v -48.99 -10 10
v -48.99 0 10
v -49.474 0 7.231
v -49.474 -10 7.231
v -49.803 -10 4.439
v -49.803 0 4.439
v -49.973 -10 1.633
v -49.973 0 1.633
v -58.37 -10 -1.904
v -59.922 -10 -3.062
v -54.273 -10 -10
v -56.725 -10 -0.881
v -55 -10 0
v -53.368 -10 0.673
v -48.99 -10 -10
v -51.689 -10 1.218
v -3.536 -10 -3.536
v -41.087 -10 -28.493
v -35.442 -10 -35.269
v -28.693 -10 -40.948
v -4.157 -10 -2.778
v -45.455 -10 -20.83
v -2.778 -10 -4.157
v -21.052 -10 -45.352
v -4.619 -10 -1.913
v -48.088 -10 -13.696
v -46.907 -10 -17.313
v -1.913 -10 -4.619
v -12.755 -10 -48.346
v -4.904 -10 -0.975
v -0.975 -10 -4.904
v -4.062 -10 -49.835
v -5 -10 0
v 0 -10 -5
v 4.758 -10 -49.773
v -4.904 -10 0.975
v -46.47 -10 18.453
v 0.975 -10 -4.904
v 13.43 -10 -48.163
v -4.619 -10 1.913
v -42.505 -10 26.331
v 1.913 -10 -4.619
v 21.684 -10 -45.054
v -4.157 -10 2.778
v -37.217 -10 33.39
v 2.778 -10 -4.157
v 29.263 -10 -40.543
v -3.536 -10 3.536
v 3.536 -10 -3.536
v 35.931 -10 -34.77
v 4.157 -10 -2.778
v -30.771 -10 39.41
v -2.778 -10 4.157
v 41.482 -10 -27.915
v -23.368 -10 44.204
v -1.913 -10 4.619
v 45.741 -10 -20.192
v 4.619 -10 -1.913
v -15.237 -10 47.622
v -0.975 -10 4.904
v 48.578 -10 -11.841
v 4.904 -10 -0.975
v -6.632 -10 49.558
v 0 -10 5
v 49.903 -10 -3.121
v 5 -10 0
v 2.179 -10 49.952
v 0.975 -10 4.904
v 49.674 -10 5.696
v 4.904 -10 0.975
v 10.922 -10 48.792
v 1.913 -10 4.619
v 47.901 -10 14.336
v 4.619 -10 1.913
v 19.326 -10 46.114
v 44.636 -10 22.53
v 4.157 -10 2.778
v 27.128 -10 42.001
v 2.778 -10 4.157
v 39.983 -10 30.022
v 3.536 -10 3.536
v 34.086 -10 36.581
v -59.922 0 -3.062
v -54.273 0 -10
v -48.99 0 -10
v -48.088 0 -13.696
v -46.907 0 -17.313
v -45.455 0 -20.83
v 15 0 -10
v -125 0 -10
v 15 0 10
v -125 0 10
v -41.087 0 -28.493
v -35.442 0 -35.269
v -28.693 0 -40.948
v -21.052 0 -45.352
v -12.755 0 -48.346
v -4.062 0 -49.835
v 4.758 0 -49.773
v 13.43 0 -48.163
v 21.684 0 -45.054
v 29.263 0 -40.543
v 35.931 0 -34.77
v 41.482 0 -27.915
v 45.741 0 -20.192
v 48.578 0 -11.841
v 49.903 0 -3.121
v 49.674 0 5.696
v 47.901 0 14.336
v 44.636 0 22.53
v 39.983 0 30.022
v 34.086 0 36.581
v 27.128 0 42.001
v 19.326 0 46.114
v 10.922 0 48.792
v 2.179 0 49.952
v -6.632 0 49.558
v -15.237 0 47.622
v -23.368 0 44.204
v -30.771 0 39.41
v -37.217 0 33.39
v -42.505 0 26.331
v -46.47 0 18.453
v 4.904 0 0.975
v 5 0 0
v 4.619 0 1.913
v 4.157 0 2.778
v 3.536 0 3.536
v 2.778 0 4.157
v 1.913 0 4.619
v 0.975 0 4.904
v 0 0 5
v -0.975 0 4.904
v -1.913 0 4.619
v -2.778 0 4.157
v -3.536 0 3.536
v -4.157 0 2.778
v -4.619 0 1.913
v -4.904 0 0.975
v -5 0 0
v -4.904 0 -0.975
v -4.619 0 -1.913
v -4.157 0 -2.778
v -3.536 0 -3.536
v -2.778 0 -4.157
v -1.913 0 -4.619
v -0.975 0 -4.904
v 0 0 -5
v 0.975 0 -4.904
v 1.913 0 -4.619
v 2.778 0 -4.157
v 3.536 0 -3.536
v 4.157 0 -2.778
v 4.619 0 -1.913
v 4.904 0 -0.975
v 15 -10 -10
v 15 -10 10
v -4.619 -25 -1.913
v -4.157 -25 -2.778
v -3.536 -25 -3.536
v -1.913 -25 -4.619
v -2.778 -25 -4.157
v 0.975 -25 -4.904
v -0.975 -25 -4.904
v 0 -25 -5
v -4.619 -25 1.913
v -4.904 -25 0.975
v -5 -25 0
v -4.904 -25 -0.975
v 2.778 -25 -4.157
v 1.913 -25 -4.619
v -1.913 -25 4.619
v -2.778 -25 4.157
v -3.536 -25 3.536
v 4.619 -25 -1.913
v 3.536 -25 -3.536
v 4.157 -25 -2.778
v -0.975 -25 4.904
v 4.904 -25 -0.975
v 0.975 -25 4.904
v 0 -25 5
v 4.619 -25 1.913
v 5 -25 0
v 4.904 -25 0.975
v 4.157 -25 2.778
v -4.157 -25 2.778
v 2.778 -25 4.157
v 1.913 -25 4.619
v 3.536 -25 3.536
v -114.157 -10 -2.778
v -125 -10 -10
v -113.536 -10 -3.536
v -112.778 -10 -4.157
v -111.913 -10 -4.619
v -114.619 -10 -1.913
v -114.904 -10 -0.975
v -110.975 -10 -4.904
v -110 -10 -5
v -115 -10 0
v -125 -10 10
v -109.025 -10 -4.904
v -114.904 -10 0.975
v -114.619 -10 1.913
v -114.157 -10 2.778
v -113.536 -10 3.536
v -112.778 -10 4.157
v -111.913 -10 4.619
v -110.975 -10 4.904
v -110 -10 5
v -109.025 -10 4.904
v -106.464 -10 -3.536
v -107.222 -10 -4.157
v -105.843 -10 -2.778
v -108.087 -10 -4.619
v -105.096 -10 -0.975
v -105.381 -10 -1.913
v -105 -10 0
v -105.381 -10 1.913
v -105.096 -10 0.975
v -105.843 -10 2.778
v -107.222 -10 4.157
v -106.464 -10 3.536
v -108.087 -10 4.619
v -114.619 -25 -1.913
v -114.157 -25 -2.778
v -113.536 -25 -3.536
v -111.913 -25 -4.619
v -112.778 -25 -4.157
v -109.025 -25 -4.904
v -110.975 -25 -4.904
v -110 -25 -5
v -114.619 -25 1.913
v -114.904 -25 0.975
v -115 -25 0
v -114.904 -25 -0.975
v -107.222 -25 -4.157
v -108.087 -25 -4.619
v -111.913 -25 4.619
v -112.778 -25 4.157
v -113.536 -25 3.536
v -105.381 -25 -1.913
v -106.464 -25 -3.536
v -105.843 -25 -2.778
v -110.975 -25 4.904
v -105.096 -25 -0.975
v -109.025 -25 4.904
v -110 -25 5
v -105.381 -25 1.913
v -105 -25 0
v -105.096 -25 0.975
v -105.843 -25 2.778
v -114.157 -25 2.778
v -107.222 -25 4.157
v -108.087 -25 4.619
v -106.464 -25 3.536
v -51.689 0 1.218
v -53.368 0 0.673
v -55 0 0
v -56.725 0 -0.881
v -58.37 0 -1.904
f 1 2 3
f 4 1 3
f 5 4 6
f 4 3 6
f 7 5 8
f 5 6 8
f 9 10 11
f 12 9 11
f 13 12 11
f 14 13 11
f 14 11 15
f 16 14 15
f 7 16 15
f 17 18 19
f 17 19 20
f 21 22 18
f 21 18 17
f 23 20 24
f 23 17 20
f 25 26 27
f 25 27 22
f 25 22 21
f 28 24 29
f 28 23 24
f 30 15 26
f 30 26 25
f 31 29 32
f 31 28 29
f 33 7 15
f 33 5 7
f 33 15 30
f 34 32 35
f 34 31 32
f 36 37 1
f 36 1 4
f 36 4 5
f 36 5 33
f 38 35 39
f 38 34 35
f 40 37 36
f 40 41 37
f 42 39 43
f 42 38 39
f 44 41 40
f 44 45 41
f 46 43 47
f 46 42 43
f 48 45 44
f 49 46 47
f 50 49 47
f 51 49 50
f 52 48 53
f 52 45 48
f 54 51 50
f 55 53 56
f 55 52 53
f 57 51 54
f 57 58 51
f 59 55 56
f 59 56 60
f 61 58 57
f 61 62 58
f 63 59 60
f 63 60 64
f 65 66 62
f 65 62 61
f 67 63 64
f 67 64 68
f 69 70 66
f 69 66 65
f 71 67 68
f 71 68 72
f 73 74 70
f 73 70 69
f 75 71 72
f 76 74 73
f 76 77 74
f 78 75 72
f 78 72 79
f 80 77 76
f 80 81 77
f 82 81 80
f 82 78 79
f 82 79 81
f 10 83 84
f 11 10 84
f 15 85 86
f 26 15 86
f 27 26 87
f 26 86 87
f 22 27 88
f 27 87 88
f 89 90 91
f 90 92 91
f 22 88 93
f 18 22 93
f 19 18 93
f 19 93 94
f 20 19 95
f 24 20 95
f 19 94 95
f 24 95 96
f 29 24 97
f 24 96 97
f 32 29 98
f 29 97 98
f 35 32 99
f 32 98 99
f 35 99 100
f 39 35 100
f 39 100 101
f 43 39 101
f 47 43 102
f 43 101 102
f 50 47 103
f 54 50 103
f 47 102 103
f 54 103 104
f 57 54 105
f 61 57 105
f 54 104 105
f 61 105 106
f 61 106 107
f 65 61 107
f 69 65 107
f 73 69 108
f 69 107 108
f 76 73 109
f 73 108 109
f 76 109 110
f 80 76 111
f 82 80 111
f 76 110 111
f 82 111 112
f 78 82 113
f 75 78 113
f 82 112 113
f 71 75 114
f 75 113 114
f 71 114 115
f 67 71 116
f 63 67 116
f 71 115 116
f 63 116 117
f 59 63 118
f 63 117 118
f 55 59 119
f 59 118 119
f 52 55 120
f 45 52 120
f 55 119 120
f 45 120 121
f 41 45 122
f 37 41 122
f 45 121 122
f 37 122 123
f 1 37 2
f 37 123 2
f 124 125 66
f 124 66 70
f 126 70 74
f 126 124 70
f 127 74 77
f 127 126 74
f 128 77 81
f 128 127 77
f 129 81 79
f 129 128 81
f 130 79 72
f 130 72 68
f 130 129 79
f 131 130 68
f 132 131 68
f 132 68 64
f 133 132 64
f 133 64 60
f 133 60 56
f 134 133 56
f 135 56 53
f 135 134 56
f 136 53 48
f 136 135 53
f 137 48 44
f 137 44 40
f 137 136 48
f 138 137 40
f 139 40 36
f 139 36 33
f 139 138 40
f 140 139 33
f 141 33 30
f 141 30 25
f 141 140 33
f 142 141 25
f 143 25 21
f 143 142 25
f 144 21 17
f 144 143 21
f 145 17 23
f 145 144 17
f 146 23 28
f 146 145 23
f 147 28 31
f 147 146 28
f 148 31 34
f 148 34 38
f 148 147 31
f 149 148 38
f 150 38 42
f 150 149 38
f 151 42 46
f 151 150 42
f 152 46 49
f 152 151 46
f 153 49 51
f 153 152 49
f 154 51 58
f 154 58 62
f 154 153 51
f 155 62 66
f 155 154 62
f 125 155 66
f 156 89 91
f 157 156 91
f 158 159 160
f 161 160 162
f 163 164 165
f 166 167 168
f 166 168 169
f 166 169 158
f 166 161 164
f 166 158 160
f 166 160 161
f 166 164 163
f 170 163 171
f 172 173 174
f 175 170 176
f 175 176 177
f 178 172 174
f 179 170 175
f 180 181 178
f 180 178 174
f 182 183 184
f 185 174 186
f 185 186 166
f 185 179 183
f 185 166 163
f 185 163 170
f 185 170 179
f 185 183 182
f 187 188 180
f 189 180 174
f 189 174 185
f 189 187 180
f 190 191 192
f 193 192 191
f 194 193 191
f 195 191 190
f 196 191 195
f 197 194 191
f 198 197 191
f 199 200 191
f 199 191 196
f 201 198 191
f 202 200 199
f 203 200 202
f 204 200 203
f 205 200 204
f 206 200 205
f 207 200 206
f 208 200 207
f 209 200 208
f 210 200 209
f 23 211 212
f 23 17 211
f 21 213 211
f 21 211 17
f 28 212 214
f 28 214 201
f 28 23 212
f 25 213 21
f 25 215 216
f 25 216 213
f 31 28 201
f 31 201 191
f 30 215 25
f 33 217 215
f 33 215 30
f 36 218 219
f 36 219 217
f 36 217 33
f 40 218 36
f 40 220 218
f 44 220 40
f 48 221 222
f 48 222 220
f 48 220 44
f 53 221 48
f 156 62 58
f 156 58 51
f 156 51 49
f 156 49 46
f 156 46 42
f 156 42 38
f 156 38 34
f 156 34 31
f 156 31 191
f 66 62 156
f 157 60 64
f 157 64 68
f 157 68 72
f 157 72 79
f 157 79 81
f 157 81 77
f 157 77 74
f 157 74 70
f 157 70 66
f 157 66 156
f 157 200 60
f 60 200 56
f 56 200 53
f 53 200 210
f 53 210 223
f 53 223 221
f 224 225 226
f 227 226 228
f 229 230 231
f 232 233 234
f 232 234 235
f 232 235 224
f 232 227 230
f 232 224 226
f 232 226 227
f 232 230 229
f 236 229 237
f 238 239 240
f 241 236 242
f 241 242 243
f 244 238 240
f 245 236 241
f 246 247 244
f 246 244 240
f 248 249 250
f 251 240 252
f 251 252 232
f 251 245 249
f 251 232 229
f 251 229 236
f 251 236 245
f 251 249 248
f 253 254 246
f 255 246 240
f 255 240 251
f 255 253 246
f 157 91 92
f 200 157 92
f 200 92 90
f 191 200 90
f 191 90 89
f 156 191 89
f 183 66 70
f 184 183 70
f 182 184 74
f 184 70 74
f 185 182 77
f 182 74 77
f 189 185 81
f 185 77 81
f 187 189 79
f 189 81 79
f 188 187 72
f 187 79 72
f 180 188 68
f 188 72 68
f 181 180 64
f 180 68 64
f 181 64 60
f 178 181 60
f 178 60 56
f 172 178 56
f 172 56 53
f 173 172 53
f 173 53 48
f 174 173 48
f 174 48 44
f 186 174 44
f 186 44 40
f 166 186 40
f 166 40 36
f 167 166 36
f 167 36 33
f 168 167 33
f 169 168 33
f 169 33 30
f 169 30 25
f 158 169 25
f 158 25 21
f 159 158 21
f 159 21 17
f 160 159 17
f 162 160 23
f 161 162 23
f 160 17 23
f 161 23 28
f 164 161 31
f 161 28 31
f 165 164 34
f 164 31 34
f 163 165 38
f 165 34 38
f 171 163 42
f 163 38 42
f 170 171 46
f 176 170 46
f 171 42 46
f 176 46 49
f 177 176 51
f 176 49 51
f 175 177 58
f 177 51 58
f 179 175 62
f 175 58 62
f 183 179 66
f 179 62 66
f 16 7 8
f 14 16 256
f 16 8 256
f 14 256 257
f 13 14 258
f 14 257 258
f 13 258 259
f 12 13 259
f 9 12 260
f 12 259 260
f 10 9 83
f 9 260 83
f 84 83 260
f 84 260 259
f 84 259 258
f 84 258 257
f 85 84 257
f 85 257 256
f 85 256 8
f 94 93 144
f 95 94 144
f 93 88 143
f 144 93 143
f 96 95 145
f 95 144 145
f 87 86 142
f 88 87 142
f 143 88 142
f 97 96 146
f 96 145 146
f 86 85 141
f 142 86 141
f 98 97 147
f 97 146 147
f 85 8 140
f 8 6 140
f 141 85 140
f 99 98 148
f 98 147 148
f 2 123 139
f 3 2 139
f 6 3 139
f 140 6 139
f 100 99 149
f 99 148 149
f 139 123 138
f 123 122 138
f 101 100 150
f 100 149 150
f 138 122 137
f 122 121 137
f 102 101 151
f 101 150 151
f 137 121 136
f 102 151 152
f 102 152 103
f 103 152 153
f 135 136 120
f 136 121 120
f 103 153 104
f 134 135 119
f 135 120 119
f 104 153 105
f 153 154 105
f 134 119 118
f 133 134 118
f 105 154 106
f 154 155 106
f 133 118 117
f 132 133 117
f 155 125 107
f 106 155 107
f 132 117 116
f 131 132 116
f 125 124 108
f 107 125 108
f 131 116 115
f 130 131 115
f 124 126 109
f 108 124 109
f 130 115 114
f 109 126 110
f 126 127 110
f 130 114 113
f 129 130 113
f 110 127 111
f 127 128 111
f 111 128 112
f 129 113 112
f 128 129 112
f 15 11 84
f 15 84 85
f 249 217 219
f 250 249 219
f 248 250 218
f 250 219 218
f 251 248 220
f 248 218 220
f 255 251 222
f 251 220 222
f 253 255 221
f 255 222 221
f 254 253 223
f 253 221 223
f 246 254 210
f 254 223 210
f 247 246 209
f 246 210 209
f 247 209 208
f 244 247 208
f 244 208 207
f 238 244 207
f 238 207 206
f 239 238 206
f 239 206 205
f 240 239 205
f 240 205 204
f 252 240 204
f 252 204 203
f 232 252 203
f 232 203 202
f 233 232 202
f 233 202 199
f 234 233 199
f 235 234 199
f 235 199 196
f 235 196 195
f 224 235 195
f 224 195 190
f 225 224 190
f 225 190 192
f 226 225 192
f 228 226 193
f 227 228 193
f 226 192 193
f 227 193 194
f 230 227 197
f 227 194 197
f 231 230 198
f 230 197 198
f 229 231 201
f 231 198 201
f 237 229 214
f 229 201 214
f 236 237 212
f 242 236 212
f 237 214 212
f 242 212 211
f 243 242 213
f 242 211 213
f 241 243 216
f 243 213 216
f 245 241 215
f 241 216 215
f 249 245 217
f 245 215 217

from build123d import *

# Parameters (mm, degrees)
F0_R     = 5
F1_DEPTH = 10
F2_DEPTH = 10
F3_DEPTH = 25


with BuildPart() as f1:
    # F0 (on Front) → F1 (new body)
    with BuildSketch(Plane.XZ):
        with BuildLine():
            ThreePointArc((-48.9897948557, -10), (-47.5316208531, -15.5159601403), (-45.4545454545, -20.8298895225))
            ThreePointArc((-45.4545454545, -20.8298895225), (10.6600358178, -48.8504210459), (50, 0))
            ThreePointArc((50, 0), (5.0254481003, 49.7468076503), (-48.9897948557, 10))
            Line((-48.9897948557, 10), (15, 10))
            Line((15, 10), (15, -10))
            Line((15, -10), (-48.9897948557, -10))
        make_face()
        with BuildLine():
            ThreePointArc((-49.9733265685, 1.6329824498), (-49.8222482499, -4.2123128242), (-48.9897948557, -10))
            Line((-48.9897948557, -10), (15, -10))
            Line((15, -10), (15, 10))
            Line((15, 10), (-48.9897948557, 10))
            ThreePointArc((-48.9897948557, 10), (-49.658096985, 5.8372428275), (-49.9733265685, 1.6329824498))
        make_face()
        Circle(F0_R, mode=Mode.SUBTRACT)
        with BuildLine():
            Line((-54.2726393539, -10), (-48.9897948557, -10))
            ThreePointArc((-48.9897948557, -10), (-49.8222482499, -4.2123128242), (-49.9733265685, 1.6329824498))
            ThreePointArc((-49.9733265685, 1.6329824498), (-52.5339055309, 0.9619130855), (-55, 0))
            ThreePointArc((-55, 0), (-57.5581280265, -1.3747285383), (-59.9218172427, -3.0619958092))
            Line((-59.9218172427, -3.0619958092), (-54.2726393539, -10))
        make_face()
    extrude(amount=F1_DEPTH)


with BuildPart() as f2:
    # F0 (on Front) → F2 (new body)
    with BuildSketch(Plane.XZ):
        with BuildLine():
            Line((-125, -10), (-54.2726393539, -10))
            Line((-54.2726393539, -10), (-59.9218172427, -3.0619958092))
            ThreePointArc((-59.9218172427, -3.0619958092), (-57.5581280265, -1.3747285383), (-55, 0))
            ThreePointArc((-55, 0), (-52.5339055309, 0.9619130855), (-49.9733265685, 1.6329824498))
            ThreePointArc((-49.9733265685, 1.6329824498), (-49.658096985, 5.8372428275), (-48.9897948557, 10))
            Line((-48.9897948557, 10), (-125, 10))
            Line((-125, 10), (-125, -10))
        make_face()
        with Locations((-110, 0)):
            Circle(F0_R, mode=Mode.SUBTRACT)
        with BuildLine():
            ThreePointArc((-49.9733265685, 1.6329824498), (-49.8222482499, -4.2123128242), (-48.9897948557, -10))
            Line((-48.9897948557, -10), (15, -10))
            Line((15, -10), (15, 10))
            Line((15, 10), (-48.9897948557, 10))
            ThreePointArc((-48.9897948557, 10), (-49.658096985, 5.8372428275), (-49.9733265685, 1.6329824498))
        make_face()
        Circle(F0_R, mode=Mode.SUBTRACT)
        with BuildLine():
            Line((-54.2726393539, -10), (-48.9897948557, -10))
            ThreePointArc((-48.9897948557, -10), (-49.8222482499, -4.2123128242), (-49.9733265685, 1.6329824498))
            ThreePointArc((-49.9733265685, 1.6329824498), (-52.5339055309, 0.9619130855), (-55, 0))
            ThreePointArc((-55, 0), (-57.5581280265, -1.3747285383), (-59.9218172427, -3.0619958092))
            Line((-59.9218172427, -3.0619958092), (-54.2726393539, -10))
        make_face()
        with Locations((-110, 0)):
            Circle(F0_R)
        Circle(F0_R)
    extrude(amount=F2_DEPTH)

    # F0 (on Front) → F3 (join)
    with BuildSketch(Plane.XZ):
        with Locations((-110, 0)):
            Circle(F0_R)
        Circle(F0_R)
    extrude(amount=F3_DEPTH)


solid = Compound([f1.part, f2.part])
